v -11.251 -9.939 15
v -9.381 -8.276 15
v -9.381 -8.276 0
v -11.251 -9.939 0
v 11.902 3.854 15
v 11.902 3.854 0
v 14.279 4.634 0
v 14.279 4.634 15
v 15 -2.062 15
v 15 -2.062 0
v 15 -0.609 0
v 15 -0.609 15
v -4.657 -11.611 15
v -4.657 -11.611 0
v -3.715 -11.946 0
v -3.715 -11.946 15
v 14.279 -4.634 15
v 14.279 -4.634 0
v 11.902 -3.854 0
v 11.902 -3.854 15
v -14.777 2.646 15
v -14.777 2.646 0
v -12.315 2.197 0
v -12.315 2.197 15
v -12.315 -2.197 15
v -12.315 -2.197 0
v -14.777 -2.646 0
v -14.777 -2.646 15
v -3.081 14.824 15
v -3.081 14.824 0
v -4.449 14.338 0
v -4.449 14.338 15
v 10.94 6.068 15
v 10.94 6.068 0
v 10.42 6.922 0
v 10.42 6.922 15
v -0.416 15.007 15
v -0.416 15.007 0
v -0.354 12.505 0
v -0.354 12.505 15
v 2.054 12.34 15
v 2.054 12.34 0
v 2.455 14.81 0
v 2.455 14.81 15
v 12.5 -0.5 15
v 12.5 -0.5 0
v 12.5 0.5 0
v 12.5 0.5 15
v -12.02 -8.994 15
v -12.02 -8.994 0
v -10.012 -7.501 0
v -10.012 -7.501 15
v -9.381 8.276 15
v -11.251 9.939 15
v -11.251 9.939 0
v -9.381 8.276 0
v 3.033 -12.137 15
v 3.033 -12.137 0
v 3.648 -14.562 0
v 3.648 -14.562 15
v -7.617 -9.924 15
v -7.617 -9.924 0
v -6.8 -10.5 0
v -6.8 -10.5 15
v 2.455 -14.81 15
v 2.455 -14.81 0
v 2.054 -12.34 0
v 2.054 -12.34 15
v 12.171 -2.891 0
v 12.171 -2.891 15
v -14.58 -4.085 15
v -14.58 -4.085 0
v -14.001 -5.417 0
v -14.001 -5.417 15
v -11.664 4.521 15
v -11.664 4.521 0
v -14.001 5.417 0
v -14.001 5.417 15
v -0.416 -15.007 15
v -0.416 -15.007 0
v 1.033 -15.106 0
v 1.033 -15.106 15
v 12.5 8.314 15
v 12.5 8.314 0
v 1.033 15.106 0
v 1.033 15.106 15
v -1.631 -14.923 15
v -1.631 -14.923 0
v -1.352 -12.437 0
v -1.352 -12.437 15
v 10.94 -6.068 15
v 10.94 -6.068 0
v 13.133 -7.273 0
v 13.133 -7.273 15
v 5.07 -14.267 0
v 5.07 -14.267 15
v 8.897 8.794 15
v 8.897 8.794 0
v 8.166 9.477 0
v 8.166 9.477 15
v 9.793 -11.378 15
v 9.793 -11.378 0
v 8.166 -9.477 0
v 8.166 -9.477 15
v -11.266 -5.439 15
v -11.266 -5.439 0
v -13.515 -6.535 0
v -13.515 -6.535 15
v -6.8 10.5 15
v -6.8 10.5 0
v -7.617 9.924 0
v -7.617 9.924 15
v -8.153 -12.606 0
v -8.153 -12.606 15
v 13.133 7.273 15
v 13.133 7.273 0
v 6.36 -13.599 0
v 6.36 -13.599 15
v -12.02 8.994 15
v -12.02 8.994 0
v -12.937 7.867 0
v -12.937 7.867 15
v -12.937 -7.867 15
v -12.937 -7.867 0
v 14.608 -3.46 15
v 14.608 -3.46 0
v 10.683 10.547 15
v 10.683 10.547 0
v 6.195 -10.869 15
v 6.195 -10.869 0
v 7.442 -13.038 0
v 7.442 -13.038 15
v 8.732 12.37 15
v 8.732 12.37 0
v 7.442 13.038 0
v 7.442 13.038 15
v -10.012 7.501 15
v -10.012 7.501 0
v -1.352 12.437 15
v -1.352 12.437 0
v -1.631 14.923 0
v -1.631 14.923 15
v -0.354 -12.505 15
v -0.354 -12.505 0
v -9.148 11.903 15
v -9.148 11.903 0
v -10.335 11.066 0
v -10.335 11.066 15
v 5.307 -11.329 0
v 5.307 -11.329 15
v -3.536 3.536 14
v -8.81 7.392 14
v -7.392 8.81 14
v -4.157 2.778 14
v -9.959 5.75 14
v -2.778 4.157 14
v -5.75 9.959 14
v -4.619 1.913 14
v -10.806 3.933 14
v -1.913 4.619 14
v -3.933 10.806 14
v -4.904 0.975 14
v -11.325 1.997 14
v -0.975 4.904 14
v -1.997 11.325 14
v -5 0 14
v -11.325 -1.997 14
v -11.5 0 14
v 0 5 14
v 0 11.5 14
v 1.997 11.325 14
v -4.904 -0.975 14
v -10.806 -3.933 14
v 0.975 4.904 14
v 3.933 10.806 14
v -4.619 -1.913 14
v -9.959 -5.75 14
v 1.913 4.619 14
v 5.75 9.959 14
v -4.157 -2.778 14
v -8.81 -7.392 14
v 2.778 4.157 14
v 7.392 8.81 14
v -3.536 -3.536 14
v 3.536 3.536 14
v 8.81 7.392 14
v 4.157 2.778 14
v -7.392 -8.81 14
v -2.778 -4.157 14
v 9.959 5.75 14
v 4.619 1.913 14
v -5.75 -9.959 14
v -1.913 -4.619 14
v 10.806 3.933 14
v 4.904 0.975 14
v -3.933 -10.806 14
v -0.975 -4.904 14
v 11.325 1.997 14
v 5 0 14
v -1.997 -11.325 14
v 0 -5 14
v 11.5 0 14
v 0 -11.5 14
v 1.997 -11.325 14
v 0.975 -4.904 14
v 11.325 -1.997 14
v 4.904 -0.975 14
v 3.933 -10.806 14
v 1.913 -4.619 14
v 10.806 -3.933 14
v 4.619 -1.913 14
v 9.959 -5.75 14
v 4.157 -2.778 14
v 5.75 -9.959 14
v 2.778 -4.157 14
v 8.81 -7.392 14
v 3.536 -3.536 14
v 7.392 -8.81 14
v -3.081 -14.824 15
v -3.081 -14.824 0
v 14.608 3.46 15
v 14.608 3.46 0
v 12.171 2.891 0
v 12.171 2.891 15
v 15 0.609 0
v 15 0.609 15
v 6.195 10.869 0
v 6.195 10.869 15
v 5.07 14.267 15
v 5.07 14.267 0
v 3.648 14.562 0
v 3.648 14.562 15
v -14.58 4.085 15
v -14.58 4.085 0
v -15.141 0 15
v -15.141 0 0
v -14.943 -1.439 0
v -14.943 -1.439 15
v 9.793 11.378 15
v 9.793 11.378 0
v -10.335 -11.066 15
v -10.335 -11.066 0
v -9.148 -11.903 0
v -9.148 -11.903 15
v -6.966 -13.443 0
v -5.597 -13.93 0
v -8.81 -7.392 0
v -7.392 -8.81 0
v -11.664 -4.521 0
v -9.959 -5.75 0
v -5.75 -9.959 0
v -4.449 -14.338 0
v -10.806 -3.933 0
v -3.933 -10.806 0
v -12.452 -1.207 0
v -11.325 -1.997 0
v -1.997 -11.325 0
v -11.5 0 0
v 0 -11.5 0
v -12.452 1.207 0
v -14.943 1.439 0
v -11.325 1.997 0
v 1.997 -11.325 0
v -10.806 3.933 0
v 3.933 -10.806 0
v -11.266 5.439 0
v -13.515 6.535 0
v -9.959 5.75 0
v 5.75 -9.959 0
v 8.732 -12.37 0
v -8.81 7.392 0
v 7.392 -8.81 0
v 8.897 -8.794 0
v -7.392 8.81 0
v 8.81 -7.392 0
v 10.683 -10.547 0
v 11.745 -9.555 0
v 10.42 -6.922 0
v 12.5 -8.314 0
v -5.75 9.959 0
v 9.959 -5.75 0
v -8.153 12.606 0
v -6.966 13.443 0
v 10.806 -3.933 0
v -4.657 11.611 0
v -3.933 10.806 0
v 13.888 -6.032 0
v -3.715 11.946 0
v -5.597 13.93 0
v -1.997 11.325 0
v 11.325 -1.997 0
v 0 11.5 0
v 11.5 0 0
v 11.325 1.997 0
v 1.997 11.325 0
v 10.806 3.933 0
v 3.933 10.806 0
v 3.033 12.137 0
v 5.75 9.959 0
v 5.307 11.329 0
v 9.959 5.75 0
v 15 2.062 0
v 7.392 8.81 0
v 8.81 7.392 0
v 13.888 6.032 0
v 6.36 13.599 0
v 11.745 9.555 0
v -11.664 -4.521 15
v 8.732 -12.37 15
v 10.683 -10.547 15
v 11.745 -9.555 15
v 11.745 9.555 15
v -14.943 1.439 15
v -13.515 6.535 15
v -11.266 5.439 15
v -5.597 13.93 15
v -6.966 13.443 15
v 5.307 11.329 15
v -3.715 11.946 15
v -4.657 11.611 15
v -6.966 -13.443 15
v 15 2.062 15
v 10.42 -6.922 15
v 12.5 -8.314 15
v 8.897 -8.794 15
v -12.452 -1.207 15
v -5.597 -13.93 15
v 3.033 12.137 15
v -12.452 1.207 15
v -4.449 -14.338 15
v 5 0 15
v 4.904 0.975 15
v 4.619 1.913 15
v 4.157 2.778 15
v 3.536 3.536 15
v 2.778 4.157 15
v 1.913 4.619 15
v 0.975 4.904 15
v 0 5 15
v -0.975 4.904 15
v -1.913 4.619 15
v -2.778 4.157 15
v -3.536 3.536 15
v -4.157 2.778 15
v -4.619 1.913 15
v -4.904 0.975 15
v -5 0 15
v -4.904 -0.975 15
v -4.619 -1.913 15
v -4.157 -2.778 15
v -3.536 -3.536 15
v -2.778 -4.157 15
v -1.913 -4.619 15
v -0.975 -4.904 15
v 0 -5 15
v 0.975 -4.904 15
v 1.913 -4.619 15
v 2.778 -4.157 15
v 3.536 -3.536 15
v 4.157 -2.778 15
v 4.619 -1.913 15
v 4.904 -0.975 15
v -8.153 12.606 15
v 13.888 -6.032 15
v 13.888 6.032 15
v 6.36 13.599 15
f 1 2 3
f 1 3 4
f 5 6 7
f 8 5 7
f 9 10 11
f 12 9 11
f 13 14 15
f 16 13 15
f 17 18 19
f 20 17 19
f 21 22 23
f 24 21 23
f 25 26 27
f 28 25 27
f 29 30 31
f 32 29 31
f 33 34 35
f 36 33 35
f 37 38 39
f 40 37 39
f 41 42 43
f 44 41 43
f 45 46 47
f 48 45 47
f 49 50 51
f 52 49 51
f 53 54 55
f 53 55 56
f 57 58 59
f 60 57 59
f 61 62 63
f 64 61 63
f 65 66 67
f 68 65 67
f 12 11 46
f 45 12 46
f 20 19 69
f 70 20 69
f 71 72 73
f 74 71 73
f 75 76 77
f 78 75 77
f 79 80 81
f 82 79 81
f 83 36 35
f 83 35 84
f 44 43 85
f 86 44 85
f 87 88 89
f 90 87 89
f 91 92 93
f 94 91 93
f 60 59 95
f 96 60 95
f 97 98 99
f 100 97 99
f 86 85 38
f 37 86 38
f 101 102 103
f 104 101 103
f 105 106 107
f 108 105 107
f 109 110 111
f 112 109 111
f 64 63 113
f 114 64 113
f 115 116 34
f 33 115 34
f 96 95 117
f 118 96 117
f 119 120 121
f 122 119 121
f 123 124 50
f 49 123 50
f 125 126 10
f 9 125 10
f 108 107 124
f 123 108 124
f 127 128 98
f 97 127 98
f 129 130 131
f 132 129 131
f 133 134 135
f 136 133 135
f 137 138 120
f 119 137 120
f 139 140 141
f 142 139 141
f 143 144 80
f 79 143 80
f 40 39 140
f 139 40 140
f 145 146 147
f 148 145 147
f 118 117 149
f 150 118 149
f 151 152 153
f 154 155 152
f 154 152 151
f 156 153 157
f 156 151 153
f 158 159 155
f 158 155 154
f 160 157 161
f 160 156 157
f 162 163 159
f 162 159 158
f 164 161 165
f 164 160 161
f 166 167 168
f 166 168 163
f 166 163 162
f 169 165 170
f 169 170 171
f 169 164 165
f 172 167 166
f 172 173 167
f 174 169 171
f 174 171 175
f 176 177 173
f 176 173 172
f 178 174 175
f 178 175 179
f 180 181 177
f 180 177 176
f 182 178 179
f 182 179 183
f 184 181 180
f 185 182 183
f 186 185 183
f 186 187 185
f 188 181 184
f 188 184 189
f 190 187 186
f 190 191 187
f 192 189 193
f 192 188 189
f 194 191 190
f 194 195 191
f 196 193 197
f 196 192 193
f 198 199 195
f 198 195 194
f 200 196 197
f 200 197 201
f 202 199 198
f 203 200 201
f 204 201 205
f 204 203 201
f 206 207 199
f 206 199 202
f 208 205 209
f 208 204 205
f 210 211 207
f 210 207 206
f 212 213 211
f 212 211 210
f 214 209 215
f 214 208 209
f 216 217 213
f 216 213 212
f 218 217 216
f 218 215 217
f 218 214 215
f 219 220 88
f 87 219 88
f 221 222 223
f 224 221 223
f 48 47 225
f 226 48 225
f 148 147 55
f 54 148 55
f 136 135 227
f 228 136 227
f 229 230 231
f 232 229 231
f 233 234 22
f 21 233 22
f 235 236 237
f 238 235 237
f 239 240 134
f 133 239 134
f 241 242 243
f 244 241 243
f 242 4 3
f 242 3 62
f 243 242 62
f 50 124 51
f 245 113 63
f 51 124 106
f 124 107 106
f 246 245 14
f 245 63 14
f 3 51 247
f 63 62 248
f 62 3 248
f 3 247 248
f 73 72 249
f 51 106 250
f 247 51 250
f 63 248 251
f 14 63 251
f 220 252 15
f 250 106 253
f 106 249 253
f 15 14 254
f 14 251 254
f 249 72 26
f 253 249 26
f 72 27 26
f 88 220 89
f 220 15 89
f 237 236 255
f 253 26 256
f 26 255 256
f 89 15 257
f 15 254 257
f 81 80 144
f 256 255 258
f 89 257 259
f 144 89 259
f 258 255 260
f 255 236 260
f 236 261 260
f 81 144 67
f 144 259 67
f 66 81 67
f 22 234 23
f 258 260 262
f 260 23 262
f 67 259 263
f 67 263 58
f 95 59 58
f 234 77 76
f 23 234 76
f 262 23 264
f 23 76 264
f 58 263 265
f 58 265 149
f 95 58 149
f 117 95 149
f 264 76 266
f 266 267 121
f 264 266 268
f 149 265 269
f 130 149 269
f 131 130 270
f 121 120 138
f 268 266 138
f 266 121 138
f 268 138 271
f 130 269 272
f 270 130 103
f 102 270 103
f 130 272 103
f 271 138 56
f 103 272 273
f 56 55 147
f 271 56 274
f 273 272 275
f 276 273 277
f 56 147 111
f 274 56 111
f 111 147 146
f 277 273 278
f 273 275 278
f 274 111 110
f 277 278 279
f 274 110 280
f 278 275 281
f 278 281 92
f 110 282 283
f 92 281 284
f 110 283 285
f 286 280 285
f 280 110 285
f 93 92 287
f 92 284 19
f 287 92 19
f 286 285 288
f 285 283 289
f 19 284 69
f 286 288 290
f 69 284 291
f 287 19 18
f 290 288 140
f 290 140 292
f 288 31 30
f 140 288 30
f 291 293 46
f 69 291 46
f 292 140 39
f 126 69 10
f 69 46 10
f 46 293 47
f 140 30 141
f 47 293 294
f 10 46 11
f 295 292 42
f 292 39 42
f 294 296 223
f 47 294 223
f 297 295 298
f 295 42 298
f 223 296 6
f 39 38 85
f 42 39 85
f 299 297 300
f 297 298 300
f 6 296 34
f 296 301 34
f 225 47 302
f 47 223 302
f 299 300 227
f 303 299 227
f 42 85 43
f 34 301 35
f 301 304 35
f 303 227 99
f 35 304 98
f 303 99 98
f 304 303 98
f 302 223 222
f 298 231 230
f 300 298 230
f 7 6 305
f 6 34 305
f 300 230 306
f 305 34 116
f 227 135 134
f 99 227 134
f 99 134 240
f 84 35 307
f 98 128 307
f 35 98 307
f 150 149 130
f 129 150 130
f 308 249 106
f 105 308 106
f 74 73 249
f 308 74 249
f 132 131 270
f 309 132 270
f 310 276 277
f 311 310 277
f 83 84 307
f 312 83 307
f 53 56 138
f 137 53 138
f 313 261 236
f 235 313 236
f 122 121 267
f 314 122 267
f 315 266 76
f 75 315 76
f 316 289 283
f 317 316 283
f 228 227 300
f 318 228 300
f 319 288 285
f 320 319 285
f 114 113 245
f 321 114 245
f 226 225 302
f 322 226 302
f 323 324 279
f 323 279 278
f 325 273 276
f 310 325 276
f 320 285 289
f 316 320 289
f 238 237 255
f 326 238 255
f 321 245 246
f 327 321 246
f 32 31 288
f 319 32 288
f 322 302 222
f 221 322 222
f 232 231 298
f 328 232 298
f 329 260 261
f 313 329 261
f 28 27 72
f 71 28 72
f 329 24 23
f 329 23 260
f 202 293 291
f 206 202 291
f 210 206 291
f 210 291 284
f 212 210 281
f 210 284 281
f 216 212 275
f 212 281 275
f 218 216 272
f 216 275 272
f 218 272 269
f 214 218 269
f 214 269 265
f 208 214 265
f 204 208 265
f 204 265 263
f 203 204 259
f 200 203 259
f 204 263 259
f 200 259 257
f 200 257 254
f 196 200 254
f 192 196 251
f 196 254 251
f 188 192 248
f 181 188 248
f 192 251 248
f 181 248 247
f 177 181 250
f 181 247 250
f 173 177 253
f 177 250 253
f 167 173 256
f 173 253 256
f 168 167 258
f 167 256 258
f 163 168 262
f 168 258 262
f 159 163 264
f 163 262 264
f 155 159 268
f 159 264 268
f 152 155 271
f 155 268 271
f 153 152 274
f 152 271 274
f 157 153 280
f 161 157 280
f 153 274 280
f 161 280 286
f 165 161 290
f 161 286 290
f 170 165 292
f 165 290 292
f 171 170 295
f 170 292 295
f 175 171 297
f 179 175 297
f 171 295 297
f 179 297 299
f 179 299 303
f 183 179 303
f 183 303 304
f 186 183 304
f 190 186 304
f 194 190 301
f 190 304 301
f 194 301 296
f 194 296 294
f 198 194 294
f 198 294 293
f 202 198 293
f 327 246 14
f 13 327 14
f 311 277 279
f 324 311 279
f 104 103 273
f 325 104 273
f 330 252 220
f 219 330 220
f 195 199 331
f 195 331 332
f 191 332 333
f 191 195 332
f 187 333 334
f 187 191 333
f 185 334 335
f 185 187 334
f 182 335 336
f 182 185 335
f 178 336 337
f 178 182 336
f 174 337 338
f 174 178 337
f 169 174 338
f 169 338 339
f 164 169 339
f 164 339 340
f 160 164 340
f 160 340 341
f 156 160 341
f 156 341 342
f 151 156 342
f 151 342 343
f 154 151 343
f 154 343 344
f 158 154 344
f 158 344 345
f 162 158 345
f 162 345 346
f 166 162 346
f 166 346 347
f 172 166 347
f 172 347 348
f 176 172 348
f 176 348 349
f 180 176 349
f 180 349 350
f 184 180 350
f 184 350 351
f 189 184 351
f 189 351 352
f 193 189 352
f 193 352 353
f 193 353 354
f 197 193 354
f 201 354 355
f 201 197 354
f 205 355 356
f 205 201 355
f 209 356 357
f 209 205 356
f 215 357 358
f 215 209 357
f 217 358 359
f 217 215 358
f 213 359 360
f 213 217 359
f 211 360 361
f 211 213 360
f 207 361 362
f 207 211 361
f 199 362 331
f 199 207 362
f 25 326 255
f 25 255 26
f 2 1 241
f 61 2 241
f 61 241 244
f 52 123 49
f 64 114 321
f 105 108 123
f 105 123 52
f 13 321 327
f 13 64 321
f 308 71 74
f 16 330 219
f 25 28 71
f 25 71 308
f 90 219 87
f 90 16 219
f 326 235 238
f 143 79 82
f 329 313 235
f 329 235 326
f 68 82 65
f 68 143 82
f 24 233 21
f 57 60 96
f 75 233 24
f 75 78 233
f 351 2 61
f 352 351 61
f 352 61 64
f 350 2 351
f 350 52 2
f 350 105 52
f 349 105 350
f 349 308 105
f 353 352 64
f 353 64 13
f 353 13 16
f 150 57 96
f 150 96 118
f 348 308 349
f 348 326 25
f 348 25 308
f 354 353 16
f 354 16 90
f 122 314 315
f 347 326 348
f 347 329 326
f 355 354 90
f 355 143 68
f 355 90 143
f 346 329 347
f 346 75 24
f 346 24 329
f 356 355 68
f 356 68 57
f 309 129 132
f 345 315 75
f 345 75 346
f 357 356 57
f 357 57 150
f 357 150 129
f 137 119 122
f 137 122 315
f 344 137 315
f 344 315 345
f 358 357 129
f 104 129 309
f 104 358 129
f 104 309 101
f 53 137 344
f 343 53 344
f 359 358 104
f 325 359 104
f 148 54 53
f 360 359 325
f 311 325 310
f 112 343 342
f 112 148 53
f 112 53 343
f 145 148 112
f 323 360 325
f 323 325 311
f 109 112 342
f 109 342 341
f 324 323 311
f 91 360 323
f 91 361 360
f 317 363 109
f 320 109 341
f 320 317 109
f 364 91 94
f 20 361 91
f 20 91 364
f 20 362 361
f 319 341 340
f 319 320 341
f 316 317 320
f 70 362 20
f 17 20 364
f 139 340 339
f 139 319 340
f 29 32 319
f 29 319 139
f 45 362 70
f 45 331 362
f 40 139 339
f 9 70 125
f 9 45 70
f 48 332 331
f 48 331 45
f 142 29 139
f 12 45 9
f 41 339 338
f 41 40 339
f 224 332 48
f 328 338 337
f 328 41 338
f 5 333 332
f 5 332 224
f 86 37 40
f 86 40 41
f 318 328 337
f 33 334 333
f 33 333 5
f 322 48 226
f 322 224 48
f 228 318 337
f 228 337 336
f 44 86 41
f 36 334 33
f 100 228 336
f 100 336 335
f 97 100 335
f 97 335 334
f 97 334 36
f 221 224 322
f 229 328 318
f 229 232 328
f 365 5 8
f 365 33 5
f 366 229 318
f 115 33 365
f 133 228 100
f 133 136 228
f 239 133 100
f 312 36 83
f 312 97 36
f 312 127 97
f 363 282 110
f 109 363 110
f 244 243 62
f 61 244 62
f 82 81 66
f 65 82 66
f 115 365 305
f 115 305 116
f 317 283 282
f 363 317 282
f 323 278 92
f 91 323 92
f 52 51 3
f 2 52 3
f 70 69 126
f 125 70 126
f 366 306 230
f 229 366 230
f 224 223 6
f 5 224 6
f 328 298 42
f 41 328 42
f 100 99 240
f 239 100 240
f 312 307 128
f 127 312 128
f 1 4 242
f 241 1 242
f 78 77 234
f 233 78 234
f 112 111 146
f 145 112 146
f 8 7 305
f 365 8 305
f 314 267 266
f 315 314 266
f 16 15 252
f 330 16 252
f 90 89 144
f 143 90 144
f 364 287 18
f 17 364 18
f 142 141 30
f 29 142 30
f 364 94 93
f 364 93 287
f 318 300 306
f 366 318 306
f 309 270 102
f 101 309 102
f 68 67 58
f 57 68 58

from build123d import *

# Parameters (mm, degrees)
F0_R     = 5
F1_DEPTH = 15
F2_R     = 11.5
F3_DEPTH = 14


with BuildPart() as f1:
    # F0 (on Top) → F1 (new body)
    with BuildSketch(Plane.XY):
        Polygon((15, 0.609152), (15, 2.061703), (14.608107, 3.460388), (12.171364, 2.891001), (11.901568, 3.853918), (14.279412, 4.633515), (13.887519, 6.032201), (13.132797, 7.273288), (10.940035, 6.06759), (10.420451, 6.922009), (12.499785, 8.314231), (11.745064, 9.555318), (10.683488, 10.546761), (8.897332, 8.794173), (8.166496, 9.476726), (9.793107, 11.378318), (8.731531, 12.369761), (7.441833, 13.038029), (6.194756, 10.868533), (5.30687, 11.328598), (6.360118, 13.598528), (5.07042, 14.266796), (3.648252, 14.562326), (3.032742, 12.136823), (2.053658, 12.340279), (2.455429, 14.810197), (1.03326, 15.105727), (-0.415904, 15.006602), (-0.354196, 12.504981), (-1.351865, 12.436738), (-1.631368, 14.923462), (-3.080532, 14.824336), (-4.449214, 14.337907), (-3.714865, 11.945701), (-4.657126, 11.610822), (-5.597175, 13.929921), (-6.965856, 13.443492), (-8.152546, 12.605835), (-6.800019, 10.500464), (-7.616989, 9.923784), (-9.147864, 11.903262), (-10.334554, 11.065605), (-11.251241, 9.938846), (-9.380847, 8.276455), (-10.011935, 7.500744), (-12.020098, 8.993793), (-12.936785, 7.867033), (-13.515483, 6.534738), (-11.265941, 5.438619), (-11.664342, 4.521408), (-14.000856, 5.417295), (-14.579554, 4.084999), (-14.777343, 2.645978), (-12.315491, 2.197426), (-12.451658, 1.20674), (-14.943235, 1.439021), (-15.141024, 0), (-14.943235, -1.439021), (-12.451658, -1.20674), (-12.315491, -2.197426), (-14.777343, -2.645978), (-14.579554, -4.084999), (-14.000856, -5.417295), (-11.664342, -4.521408), (-11.265941, -5.438619), (-13.515483, -6.534738), (-12.936785, -7.867033), (-12.020098, -8.993793), (-10.011935, -7.500744), (-9.380847, -8.276455), (-11.251241, -9.938846), (-10.334554, -11.065605), (-9.147864, -11.903262), (-7.616989, -9.923784), (-6.800019, -10.500464), (-8.152546, -12.605835), (-6.965856, -13.443492), (-5.597175, -13.929921), (-4.657126, -11.610822), (-3.714865, -11.945701), (-4.449214, -14.337907), (-3.080532, -14.824336), (-1.631368, -14.923462), (-1.351865, -12.436738), (-0.354196, -12.504981), (-0.415904, -15.006602), (1.03326, -15.105727), (2.455429, -14.810197), (2.053658, -12.340279), (3.032742, -12.136823), (3.648252, -14.562326), (5.07042, -14.266796), (6.360118, -13.598528), (5.30687, -11.328598), (6.194756, -10.868533), (7.441833, -13.038029), (8.731531, -12.369761), (9.793107, -11.378318), (8.166496, -9.476726), (8.897332, -8.794173), (10.683488, -10.546761), (11.745064, -9.555318), (12.499785, -8.314231), (10.420451, -6.922009), (10.940035, -6.06759), (13.132797, -7.273288), (13.887519, -6.032201), (14.279412, -4.633515), (11.901568, -3.853918), (12.171364, -2.891001), (14.608107, -3.460388), (15, -2.061703), (15, -0.609152), (12.5, -0.5), (12.5, 0.5), align=None)
        Circle(F0_R, mode=Mode.SUBTRACT)
    extrude(amount=F1_DEPTH)

    # F2 (on face) → F3 (cut)
    with BuildSketch(Plane(origin=(0, 0, 0), x_dir=(1, 0, 0), z_dir=(0, 0, -1))):
        Circle(F2_R)
    extrude(amount=-F3_DEPTH, mode=Mode.SUBTRACT)


solid = f1.part
